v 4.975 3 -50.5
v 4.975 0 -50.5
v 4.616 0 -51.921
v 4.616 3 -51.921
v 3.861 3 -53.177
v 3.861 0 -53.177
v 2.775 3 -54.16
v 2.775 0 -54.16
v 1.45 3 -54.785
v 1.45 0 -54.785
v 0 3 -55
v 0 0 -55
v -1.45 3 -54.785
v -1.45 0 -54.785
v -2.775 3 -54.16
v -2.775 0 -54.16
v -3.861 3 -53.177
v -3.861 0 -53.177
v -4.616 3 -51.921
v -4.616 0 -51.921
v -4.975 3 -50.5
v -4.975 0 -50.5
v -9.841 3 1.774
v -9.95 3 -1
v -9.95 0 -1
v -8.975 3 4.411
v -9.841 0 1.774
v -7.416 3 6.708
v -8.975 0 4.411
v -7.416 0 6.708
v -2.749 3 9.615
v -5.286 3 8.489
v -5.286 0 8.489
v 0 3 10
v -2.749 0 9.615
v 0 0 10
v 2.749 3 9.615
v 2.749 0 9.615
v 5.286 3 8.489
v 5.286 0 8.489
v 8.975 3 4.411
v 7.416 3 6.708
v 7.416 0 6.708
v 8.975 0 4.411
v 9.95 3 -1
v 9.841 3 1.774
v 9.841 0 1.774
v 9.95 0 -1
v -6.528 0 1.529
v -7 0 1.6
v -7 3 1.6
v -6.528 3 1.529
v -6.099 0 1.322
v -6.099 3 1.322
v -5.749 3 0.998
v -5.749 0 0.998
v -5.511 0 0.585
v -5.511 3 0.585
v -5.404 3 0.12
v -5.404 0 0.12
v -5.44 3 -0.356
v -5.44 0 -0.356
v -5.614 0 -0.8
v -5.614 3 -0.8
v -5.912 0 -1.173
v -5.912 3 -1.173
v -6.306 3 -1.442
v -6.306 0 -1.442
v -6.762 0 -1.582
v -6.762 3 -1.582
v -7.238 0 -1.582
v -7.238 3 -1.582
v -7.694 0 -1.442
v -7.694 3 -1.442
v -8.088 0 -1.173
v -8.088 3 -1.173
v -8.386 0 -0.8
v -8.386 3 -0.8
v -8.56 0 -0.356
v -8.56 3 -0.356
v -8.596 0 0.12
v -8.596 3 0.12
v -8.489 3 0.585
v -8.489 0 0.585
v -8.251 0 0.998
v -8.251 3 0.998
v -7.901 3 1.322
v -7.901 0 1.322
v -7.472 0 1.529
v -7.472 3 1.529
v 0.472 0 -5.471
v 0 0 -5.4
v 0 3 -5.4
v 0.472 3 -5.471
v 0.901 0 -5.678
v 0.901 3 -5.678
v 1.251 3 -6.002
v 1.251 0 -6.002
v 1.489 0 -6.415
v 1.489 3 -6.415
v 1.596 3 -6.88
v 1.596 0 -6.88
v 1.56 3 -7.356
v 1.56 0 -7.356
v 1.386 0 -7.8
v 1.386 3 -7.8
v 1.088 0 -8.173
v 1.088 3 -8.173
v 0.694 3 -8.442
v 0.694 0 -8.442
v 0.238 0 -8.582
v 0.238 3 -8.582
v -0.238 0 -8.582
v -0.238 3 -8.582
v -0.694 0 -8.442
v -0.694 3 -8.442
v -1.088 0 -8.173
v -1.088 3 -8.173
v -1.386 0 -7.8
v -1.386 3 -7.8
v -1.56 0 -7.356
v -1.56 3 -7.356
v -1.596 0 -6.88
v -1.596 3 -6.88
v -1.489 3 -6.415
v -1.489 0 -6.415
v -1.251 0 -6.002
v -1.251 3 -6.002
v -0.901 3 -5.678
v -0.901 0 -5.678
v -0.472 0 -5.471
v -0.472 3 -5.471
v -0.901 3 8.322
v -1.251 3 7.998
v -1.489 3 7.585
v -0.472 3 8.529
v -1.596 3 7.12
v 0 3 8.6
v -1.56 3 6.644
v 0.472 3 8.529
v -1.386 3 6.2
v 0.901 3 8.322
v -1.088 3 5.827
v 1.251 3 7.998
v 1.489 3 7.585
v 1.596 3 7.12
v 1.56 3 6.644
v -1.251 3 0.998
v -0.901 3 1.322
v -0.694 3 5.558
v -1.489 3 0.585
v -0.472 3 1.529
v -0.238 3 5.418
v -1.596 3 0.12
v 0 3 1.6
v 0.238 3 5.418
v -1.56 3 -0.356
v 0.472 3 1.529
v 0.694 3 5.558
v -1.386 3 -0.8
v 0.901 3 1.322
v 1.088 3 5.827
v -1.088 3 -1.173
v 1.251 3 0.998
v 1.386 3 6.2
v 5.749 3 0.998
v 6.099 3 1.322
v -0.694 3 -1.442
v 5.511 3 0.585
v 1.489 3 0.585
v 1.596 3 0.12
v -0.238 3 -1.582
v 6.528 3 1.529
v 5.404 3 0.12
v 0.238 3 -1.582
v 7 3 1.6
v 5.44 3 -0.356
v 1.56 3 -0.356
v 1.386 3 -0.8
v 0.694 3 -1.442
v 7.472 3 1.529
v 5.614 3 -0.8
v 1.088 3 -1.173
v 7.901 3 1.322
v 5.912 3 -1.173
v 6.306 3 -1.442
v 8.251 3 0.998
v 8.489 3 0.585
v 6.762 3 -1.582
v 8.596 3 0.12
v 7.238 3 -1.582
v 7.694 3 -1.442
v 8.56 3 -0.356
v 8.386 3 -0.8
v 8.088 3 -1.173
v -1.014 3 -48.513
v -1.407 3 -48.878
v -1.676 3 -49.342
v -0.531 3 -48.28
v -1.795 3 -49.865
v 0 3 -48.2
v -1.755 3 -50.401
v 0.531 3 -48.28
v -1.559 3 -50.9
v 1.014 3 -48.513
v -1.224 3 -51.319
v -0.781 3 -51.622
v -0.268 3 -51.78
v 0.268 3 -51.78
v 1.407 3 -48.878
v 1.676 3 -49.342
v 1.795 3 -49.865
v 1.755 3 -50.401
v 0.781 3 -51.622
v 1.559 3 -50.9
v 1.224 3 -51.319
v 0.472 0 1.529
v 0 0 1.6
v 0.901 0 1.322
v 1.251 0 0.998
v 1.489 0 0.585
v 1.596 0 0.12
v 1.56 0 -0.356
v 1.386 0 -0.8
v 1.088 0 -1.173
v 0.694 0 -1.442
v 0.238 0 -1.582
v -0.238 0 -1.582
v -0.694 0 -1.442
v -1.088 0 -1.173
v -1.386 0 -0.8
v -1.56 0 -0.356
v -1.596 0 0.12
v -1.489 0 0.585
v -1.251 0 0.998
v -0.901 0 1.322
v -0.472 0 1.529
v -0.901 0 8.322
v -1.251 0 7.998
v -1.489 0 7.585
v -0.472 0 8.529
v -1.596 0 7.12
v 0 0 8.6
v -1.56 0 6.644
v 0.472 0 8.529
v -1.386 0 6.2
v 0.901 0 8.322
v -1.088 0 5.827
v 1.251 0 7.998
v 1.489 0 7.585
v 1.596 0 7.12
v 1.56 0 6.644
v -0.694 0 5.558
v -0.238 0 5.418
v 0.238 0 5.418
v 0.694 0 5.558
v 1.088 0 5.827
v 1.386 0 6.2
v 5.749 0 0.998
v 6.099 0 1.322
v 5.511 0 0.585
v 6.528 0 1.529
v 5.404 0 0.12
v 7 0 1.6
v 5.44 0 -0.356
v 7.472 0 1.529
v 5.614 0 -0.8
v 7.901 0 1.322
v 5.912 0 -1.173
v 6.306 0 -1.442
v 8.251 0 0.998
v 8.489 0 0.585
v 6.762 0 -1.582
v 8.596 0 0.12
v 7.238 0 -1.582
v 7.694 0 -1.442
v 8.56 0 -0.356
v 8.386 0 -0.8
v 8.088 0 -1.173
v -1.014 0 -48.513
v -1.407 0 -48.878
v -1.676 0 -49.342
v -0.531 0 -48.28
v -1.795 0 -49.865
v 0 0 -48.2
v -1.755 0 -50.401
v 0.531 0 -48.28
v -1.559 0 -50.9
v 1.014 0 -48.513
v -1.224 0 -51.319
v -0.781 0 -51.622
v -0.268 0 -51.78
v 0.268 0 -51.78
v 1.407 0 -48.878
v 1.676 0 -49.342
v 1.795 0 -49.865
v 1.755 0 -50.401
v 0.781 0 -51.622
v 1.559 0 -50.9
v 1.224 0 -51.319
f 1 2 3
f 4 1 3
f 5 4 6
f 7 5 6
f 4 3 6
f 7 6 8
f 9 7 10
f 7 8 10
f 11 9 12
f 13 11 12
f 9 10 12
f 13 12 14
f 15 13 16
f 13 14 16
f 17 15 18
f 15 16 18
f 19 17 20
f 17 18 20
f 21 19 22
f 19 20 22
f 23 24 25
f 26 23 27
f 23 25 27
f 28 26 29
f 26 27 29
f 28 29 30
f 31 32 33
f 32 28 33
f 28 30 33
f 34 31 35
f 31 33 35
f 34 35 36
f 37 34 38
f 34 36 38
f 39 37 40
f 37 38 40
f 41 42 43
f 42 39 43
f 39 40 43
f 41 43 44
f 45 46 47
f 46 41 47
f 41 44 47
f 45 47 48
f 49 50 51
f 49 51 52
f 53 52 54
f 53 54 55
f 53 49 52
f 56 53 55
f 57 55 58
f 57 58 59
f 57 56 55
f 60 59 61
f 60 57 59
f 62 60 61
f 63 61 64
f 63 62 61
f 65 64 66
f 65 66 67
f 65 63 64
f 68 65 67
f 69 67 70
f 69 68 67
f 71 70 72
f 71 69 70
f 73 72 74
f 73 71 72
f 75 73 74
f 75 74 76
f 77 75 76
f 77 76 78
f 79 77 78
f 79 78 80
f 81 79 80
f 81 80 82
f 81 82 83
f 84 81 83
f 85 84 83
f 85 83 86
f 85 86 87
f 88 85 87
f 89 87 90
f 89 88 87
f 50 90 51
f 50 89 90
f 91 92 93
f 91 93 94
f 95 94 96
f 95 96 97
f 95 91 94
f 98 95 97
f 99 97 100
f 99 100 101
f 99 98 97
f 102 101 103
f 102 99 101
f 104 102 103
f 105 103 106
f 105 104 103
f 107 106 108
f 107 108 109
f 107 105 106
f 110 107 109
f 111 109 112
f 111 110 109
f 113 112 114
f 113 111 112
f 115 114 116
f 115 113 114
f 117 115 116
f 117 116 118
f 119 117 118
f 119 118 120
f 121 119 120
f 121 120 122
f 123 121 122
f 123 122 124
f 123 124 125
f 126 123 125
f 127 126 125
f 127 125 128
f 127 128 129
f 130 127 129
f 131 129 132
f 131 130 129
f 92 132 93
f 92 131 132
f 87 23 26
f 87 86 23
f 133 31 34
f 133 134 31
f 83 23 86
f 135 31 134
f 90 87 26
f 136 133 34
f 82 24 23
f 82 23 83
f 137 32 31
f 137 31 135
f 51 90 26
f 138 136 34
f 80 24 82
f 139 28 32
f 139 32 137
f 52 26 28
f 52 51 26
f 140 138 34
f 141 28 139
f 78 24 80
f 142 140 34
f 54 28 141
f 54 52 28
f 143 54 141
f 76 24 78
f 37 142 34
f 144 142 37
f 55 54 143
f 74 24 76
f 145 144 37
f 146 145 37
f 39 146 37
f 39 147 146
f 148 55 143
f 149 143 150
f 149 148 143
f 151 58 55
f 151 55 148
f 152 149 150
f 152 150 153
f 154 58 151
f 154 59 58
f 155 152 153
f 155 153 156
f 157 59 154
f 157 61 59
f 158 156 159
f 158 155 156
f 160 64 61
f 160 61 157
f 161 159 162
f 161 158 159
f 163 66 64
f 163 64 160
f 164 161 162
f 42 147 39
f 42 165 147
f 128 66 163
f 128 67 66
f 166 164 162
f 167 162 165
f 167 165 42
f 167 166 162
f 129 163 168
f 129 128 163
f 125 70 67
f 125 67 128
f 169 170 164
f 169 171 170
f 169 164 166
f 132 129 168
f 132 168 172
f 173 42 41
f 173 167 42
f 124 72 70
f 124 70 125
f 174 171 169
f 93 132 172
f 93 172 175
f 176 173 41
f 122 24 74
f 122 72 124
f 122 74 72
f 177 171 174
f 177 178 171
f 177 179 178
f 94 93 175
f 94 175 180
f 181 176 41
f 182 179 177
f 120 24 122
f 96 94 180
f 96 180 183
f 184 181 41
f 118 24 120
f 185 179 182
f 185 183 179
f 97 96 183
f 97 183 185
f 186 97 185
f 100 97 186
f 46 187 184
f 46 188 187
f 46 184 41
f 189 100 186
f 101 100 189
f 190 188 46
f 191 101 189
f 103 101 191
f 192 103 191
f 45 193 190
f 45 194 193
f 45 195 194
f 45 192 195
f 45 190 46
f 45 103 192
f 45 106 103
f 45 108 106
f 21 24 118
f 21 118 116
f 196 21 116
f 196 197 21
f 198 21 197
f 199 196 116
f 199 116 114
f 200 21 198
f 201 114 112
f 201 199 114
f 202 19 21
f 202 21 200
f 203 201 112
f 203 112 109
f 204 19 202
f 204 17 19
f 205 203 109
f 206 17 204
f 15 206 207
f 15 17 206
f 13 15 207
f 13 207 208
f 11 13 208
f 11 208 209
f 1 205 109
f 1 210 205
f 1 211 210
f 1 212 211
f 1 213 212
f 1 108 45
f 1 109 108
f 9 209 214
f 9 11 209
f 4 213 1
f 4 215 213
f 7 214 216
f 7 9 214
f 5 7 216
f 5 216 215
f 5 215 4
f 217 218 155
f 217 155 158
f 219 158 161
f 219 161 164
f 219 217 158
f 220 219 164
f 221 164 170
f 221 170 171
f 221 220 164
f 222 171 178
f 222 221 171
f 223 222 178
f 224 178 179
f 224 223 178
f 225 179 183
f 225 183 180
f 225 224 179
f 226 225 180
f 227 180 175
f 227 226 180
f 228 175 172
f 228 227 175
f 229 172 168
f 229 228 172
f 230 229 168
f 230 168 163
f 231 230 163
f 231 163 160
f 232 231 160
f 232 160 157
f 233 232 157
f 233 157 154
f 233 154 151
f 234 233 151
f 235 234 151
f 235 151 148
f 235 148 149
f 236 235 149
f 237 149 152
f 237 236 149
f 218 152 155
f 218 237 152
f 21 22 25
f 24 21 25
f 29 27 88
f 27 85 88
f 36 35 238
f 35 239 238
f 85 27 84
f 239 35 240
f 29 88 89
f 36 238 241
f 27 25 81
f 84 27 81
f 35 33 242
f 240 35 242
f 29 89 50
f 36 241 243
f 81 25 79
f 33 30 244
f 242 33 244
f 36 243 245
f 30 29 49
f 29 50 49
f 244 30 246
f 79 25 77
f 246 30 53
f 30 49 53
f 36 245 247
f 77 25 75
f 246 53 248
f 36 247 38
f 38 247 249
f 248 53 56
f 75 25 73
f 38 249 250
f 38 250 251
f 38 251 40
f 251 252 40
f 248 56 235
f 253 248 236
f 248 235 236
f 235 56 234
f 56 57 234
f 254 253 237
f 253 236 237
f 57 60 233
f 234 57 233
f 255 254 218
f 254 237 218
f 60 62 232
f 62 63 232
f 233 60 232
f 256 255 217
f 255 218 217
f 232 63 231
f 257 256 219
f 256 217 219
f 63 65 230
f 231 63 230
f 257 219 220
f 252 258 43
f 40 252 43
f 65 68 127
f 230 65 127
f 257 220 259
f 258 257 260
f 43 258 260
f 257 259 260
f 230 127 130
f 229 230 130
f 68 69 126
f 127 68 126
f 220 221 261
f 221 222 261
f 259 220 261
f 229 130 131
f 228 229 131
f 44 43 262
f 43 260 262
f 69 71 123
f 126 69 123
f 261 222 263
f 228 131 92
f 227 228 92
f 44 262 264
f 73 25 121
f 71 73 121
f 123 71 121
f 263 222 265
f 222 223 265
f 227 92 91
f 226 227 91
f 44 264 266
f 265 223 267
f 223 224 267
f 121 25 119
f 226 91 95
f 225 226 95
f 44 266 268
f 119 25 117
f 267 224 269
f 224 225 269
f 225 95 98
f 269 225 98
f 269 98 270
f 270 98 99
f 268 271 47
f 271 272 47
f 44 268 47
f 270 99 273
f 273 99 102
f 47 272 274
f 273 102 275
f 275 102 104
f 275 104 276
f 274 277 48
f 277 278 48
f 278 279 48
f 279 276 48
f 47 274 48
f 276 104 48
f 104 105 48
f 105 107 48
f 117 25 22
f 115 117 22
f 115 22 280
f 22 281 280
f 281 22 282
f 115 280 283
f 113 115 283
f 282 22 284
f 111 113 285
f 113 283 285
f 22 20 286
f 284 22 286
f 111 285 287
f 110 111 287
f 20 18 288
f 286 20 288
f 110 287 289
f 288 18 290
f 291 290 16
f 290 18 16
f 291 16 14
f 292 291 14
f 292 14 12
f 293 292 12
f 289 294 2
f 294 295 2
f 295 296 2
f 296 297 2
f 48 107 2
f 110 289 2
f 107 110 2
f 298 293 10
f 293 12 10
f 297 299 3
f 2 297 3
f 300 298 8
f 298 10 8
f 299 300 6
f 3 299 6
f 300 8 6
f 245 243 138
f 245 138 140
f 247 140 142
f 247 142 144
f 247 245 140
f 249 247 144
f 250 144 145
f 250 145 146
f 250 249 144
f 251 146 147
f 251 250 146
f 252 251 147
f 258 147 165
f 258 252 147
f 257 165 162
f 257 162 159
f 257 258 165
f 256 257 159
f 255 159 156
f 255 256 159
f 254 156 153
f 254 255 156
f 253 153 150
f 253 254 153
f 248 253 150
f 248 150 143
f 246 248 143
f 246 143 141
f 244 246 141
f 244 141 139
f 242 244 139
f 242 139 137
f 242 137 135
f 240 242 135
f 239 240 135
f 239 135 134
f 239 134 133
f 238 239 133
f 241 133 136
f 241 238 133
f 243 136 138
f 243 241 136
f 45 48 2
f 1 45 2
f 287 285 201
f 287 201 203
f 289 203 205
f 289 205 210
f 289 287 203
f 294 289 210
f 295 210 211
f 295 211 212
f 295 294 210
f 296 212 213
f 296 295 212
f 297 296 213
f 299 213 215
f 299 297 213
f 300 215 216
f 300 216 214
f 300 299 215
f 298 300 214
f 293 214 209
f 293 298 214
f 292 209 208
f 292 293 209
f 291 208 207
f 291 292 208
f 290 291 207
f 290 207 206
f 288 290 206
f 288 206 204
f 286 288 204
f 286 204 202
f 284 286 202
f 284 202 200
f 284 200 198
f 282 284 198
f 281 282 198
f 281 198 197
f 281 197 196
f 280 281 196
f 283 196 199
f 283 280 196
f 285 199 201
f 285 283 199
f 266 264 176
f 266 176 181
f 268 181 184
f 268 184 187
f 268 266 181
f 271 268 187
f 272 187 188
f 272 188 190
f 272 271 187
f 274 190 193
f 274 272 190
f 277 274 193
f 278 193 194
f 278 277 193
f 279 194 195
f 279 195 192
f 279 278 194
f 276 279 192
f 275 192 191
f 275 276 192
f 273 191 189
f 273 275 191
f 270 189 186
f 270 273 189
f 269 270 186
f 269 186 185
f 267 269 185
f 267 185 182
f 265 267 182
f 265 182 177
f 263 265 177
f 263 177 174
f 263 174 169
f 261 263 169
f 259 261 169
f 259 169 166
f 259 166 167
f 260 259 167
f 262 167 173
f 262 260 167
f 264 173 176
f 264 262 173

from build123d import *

# Parameters (mm, degrees)
SKETCH_1_R      = 5
SKETCH_1_R_2    = 1.8
SKETCH_1_R_3    = 10
SKETCH_1_R_4    = 1.6
EXTRUDE_1_DEPTH = 3


with BuildPart() as part:
    # 草图1 → 凸台-拉伸1 (new body)
    # profile 1 of 3: a face of its own
    with BuildSketch(Plane(origin=(0, 0, 0), x_dir=(1, 0, 0), z_dir=(0, 1, 0))):
        with Locations((0, 50)):
            Circle(SKETCH_1_R)
        with Locations(Location((0, 50, 0), (0, 0, 270))):
            Circle(SKETCH_1_R_2, mode=Mode.SUBTRACT)
    # profile 2 of 3: a face of its own
    with BuildSketch(Plane(origin=(0, 0, 0), x_dir=(1, 0, 0), z_dir=(0, 1, 0))):
        with BuildLine():
            ThreePointArc((5, 50), (-0.250313875, 45.006269634), (-4.974937186, 50.5))
            Line((-4.974937186, 50.5), (-9.949874371, 1))
            ThreePointArc((-9.949874371, 1), (0, 10), (9.949874371, 1))
            Line((9.949874371, 1), (4.974937186, 50.5))
            ThreePointArc((4.974937186, 50.5), (4.993730366, 50.250313875), (5, 50))
        make_face()
    # profile 3 of 3: a face of its own
    with BuildSketch(Plane(origin=(0, 0, 0), x_dir=(1, 0, 0), z_dir=(0, 1, 0))):
        Circle(SKETCH_1_R_3)
        with Locations(Location((7, 0, 0), (0, 0, 270))):
            Circle(SKETCH_1_R_4, mode=Mode.SUBTRACT)
        with Locations(Location((0, 7, 0), (0, 0, 270))):
            Circle(SKETCH_1_R_4, mode=Mode.SUBTRACT)
        with Locations(Location((0, 0, 0), (0, 0, 270))):
            Circle(SKETCH_1_R_4, mode=Mode.SUBTRACT)
        with Locations(Location((0, -7, 0), (0, 0, 270))):
            Circle(SKETCH_1_R_4, mode=Mode.SUBTRACT)
        with Locations(Location((-7, 0, 0), (0, 0, 270))):
            Circle(SKETCH_1_R_4, mode=Mode.SUBTRACT)
    extrude(amount=EXTRUDE_1_DEPTH)


solid = part.part
